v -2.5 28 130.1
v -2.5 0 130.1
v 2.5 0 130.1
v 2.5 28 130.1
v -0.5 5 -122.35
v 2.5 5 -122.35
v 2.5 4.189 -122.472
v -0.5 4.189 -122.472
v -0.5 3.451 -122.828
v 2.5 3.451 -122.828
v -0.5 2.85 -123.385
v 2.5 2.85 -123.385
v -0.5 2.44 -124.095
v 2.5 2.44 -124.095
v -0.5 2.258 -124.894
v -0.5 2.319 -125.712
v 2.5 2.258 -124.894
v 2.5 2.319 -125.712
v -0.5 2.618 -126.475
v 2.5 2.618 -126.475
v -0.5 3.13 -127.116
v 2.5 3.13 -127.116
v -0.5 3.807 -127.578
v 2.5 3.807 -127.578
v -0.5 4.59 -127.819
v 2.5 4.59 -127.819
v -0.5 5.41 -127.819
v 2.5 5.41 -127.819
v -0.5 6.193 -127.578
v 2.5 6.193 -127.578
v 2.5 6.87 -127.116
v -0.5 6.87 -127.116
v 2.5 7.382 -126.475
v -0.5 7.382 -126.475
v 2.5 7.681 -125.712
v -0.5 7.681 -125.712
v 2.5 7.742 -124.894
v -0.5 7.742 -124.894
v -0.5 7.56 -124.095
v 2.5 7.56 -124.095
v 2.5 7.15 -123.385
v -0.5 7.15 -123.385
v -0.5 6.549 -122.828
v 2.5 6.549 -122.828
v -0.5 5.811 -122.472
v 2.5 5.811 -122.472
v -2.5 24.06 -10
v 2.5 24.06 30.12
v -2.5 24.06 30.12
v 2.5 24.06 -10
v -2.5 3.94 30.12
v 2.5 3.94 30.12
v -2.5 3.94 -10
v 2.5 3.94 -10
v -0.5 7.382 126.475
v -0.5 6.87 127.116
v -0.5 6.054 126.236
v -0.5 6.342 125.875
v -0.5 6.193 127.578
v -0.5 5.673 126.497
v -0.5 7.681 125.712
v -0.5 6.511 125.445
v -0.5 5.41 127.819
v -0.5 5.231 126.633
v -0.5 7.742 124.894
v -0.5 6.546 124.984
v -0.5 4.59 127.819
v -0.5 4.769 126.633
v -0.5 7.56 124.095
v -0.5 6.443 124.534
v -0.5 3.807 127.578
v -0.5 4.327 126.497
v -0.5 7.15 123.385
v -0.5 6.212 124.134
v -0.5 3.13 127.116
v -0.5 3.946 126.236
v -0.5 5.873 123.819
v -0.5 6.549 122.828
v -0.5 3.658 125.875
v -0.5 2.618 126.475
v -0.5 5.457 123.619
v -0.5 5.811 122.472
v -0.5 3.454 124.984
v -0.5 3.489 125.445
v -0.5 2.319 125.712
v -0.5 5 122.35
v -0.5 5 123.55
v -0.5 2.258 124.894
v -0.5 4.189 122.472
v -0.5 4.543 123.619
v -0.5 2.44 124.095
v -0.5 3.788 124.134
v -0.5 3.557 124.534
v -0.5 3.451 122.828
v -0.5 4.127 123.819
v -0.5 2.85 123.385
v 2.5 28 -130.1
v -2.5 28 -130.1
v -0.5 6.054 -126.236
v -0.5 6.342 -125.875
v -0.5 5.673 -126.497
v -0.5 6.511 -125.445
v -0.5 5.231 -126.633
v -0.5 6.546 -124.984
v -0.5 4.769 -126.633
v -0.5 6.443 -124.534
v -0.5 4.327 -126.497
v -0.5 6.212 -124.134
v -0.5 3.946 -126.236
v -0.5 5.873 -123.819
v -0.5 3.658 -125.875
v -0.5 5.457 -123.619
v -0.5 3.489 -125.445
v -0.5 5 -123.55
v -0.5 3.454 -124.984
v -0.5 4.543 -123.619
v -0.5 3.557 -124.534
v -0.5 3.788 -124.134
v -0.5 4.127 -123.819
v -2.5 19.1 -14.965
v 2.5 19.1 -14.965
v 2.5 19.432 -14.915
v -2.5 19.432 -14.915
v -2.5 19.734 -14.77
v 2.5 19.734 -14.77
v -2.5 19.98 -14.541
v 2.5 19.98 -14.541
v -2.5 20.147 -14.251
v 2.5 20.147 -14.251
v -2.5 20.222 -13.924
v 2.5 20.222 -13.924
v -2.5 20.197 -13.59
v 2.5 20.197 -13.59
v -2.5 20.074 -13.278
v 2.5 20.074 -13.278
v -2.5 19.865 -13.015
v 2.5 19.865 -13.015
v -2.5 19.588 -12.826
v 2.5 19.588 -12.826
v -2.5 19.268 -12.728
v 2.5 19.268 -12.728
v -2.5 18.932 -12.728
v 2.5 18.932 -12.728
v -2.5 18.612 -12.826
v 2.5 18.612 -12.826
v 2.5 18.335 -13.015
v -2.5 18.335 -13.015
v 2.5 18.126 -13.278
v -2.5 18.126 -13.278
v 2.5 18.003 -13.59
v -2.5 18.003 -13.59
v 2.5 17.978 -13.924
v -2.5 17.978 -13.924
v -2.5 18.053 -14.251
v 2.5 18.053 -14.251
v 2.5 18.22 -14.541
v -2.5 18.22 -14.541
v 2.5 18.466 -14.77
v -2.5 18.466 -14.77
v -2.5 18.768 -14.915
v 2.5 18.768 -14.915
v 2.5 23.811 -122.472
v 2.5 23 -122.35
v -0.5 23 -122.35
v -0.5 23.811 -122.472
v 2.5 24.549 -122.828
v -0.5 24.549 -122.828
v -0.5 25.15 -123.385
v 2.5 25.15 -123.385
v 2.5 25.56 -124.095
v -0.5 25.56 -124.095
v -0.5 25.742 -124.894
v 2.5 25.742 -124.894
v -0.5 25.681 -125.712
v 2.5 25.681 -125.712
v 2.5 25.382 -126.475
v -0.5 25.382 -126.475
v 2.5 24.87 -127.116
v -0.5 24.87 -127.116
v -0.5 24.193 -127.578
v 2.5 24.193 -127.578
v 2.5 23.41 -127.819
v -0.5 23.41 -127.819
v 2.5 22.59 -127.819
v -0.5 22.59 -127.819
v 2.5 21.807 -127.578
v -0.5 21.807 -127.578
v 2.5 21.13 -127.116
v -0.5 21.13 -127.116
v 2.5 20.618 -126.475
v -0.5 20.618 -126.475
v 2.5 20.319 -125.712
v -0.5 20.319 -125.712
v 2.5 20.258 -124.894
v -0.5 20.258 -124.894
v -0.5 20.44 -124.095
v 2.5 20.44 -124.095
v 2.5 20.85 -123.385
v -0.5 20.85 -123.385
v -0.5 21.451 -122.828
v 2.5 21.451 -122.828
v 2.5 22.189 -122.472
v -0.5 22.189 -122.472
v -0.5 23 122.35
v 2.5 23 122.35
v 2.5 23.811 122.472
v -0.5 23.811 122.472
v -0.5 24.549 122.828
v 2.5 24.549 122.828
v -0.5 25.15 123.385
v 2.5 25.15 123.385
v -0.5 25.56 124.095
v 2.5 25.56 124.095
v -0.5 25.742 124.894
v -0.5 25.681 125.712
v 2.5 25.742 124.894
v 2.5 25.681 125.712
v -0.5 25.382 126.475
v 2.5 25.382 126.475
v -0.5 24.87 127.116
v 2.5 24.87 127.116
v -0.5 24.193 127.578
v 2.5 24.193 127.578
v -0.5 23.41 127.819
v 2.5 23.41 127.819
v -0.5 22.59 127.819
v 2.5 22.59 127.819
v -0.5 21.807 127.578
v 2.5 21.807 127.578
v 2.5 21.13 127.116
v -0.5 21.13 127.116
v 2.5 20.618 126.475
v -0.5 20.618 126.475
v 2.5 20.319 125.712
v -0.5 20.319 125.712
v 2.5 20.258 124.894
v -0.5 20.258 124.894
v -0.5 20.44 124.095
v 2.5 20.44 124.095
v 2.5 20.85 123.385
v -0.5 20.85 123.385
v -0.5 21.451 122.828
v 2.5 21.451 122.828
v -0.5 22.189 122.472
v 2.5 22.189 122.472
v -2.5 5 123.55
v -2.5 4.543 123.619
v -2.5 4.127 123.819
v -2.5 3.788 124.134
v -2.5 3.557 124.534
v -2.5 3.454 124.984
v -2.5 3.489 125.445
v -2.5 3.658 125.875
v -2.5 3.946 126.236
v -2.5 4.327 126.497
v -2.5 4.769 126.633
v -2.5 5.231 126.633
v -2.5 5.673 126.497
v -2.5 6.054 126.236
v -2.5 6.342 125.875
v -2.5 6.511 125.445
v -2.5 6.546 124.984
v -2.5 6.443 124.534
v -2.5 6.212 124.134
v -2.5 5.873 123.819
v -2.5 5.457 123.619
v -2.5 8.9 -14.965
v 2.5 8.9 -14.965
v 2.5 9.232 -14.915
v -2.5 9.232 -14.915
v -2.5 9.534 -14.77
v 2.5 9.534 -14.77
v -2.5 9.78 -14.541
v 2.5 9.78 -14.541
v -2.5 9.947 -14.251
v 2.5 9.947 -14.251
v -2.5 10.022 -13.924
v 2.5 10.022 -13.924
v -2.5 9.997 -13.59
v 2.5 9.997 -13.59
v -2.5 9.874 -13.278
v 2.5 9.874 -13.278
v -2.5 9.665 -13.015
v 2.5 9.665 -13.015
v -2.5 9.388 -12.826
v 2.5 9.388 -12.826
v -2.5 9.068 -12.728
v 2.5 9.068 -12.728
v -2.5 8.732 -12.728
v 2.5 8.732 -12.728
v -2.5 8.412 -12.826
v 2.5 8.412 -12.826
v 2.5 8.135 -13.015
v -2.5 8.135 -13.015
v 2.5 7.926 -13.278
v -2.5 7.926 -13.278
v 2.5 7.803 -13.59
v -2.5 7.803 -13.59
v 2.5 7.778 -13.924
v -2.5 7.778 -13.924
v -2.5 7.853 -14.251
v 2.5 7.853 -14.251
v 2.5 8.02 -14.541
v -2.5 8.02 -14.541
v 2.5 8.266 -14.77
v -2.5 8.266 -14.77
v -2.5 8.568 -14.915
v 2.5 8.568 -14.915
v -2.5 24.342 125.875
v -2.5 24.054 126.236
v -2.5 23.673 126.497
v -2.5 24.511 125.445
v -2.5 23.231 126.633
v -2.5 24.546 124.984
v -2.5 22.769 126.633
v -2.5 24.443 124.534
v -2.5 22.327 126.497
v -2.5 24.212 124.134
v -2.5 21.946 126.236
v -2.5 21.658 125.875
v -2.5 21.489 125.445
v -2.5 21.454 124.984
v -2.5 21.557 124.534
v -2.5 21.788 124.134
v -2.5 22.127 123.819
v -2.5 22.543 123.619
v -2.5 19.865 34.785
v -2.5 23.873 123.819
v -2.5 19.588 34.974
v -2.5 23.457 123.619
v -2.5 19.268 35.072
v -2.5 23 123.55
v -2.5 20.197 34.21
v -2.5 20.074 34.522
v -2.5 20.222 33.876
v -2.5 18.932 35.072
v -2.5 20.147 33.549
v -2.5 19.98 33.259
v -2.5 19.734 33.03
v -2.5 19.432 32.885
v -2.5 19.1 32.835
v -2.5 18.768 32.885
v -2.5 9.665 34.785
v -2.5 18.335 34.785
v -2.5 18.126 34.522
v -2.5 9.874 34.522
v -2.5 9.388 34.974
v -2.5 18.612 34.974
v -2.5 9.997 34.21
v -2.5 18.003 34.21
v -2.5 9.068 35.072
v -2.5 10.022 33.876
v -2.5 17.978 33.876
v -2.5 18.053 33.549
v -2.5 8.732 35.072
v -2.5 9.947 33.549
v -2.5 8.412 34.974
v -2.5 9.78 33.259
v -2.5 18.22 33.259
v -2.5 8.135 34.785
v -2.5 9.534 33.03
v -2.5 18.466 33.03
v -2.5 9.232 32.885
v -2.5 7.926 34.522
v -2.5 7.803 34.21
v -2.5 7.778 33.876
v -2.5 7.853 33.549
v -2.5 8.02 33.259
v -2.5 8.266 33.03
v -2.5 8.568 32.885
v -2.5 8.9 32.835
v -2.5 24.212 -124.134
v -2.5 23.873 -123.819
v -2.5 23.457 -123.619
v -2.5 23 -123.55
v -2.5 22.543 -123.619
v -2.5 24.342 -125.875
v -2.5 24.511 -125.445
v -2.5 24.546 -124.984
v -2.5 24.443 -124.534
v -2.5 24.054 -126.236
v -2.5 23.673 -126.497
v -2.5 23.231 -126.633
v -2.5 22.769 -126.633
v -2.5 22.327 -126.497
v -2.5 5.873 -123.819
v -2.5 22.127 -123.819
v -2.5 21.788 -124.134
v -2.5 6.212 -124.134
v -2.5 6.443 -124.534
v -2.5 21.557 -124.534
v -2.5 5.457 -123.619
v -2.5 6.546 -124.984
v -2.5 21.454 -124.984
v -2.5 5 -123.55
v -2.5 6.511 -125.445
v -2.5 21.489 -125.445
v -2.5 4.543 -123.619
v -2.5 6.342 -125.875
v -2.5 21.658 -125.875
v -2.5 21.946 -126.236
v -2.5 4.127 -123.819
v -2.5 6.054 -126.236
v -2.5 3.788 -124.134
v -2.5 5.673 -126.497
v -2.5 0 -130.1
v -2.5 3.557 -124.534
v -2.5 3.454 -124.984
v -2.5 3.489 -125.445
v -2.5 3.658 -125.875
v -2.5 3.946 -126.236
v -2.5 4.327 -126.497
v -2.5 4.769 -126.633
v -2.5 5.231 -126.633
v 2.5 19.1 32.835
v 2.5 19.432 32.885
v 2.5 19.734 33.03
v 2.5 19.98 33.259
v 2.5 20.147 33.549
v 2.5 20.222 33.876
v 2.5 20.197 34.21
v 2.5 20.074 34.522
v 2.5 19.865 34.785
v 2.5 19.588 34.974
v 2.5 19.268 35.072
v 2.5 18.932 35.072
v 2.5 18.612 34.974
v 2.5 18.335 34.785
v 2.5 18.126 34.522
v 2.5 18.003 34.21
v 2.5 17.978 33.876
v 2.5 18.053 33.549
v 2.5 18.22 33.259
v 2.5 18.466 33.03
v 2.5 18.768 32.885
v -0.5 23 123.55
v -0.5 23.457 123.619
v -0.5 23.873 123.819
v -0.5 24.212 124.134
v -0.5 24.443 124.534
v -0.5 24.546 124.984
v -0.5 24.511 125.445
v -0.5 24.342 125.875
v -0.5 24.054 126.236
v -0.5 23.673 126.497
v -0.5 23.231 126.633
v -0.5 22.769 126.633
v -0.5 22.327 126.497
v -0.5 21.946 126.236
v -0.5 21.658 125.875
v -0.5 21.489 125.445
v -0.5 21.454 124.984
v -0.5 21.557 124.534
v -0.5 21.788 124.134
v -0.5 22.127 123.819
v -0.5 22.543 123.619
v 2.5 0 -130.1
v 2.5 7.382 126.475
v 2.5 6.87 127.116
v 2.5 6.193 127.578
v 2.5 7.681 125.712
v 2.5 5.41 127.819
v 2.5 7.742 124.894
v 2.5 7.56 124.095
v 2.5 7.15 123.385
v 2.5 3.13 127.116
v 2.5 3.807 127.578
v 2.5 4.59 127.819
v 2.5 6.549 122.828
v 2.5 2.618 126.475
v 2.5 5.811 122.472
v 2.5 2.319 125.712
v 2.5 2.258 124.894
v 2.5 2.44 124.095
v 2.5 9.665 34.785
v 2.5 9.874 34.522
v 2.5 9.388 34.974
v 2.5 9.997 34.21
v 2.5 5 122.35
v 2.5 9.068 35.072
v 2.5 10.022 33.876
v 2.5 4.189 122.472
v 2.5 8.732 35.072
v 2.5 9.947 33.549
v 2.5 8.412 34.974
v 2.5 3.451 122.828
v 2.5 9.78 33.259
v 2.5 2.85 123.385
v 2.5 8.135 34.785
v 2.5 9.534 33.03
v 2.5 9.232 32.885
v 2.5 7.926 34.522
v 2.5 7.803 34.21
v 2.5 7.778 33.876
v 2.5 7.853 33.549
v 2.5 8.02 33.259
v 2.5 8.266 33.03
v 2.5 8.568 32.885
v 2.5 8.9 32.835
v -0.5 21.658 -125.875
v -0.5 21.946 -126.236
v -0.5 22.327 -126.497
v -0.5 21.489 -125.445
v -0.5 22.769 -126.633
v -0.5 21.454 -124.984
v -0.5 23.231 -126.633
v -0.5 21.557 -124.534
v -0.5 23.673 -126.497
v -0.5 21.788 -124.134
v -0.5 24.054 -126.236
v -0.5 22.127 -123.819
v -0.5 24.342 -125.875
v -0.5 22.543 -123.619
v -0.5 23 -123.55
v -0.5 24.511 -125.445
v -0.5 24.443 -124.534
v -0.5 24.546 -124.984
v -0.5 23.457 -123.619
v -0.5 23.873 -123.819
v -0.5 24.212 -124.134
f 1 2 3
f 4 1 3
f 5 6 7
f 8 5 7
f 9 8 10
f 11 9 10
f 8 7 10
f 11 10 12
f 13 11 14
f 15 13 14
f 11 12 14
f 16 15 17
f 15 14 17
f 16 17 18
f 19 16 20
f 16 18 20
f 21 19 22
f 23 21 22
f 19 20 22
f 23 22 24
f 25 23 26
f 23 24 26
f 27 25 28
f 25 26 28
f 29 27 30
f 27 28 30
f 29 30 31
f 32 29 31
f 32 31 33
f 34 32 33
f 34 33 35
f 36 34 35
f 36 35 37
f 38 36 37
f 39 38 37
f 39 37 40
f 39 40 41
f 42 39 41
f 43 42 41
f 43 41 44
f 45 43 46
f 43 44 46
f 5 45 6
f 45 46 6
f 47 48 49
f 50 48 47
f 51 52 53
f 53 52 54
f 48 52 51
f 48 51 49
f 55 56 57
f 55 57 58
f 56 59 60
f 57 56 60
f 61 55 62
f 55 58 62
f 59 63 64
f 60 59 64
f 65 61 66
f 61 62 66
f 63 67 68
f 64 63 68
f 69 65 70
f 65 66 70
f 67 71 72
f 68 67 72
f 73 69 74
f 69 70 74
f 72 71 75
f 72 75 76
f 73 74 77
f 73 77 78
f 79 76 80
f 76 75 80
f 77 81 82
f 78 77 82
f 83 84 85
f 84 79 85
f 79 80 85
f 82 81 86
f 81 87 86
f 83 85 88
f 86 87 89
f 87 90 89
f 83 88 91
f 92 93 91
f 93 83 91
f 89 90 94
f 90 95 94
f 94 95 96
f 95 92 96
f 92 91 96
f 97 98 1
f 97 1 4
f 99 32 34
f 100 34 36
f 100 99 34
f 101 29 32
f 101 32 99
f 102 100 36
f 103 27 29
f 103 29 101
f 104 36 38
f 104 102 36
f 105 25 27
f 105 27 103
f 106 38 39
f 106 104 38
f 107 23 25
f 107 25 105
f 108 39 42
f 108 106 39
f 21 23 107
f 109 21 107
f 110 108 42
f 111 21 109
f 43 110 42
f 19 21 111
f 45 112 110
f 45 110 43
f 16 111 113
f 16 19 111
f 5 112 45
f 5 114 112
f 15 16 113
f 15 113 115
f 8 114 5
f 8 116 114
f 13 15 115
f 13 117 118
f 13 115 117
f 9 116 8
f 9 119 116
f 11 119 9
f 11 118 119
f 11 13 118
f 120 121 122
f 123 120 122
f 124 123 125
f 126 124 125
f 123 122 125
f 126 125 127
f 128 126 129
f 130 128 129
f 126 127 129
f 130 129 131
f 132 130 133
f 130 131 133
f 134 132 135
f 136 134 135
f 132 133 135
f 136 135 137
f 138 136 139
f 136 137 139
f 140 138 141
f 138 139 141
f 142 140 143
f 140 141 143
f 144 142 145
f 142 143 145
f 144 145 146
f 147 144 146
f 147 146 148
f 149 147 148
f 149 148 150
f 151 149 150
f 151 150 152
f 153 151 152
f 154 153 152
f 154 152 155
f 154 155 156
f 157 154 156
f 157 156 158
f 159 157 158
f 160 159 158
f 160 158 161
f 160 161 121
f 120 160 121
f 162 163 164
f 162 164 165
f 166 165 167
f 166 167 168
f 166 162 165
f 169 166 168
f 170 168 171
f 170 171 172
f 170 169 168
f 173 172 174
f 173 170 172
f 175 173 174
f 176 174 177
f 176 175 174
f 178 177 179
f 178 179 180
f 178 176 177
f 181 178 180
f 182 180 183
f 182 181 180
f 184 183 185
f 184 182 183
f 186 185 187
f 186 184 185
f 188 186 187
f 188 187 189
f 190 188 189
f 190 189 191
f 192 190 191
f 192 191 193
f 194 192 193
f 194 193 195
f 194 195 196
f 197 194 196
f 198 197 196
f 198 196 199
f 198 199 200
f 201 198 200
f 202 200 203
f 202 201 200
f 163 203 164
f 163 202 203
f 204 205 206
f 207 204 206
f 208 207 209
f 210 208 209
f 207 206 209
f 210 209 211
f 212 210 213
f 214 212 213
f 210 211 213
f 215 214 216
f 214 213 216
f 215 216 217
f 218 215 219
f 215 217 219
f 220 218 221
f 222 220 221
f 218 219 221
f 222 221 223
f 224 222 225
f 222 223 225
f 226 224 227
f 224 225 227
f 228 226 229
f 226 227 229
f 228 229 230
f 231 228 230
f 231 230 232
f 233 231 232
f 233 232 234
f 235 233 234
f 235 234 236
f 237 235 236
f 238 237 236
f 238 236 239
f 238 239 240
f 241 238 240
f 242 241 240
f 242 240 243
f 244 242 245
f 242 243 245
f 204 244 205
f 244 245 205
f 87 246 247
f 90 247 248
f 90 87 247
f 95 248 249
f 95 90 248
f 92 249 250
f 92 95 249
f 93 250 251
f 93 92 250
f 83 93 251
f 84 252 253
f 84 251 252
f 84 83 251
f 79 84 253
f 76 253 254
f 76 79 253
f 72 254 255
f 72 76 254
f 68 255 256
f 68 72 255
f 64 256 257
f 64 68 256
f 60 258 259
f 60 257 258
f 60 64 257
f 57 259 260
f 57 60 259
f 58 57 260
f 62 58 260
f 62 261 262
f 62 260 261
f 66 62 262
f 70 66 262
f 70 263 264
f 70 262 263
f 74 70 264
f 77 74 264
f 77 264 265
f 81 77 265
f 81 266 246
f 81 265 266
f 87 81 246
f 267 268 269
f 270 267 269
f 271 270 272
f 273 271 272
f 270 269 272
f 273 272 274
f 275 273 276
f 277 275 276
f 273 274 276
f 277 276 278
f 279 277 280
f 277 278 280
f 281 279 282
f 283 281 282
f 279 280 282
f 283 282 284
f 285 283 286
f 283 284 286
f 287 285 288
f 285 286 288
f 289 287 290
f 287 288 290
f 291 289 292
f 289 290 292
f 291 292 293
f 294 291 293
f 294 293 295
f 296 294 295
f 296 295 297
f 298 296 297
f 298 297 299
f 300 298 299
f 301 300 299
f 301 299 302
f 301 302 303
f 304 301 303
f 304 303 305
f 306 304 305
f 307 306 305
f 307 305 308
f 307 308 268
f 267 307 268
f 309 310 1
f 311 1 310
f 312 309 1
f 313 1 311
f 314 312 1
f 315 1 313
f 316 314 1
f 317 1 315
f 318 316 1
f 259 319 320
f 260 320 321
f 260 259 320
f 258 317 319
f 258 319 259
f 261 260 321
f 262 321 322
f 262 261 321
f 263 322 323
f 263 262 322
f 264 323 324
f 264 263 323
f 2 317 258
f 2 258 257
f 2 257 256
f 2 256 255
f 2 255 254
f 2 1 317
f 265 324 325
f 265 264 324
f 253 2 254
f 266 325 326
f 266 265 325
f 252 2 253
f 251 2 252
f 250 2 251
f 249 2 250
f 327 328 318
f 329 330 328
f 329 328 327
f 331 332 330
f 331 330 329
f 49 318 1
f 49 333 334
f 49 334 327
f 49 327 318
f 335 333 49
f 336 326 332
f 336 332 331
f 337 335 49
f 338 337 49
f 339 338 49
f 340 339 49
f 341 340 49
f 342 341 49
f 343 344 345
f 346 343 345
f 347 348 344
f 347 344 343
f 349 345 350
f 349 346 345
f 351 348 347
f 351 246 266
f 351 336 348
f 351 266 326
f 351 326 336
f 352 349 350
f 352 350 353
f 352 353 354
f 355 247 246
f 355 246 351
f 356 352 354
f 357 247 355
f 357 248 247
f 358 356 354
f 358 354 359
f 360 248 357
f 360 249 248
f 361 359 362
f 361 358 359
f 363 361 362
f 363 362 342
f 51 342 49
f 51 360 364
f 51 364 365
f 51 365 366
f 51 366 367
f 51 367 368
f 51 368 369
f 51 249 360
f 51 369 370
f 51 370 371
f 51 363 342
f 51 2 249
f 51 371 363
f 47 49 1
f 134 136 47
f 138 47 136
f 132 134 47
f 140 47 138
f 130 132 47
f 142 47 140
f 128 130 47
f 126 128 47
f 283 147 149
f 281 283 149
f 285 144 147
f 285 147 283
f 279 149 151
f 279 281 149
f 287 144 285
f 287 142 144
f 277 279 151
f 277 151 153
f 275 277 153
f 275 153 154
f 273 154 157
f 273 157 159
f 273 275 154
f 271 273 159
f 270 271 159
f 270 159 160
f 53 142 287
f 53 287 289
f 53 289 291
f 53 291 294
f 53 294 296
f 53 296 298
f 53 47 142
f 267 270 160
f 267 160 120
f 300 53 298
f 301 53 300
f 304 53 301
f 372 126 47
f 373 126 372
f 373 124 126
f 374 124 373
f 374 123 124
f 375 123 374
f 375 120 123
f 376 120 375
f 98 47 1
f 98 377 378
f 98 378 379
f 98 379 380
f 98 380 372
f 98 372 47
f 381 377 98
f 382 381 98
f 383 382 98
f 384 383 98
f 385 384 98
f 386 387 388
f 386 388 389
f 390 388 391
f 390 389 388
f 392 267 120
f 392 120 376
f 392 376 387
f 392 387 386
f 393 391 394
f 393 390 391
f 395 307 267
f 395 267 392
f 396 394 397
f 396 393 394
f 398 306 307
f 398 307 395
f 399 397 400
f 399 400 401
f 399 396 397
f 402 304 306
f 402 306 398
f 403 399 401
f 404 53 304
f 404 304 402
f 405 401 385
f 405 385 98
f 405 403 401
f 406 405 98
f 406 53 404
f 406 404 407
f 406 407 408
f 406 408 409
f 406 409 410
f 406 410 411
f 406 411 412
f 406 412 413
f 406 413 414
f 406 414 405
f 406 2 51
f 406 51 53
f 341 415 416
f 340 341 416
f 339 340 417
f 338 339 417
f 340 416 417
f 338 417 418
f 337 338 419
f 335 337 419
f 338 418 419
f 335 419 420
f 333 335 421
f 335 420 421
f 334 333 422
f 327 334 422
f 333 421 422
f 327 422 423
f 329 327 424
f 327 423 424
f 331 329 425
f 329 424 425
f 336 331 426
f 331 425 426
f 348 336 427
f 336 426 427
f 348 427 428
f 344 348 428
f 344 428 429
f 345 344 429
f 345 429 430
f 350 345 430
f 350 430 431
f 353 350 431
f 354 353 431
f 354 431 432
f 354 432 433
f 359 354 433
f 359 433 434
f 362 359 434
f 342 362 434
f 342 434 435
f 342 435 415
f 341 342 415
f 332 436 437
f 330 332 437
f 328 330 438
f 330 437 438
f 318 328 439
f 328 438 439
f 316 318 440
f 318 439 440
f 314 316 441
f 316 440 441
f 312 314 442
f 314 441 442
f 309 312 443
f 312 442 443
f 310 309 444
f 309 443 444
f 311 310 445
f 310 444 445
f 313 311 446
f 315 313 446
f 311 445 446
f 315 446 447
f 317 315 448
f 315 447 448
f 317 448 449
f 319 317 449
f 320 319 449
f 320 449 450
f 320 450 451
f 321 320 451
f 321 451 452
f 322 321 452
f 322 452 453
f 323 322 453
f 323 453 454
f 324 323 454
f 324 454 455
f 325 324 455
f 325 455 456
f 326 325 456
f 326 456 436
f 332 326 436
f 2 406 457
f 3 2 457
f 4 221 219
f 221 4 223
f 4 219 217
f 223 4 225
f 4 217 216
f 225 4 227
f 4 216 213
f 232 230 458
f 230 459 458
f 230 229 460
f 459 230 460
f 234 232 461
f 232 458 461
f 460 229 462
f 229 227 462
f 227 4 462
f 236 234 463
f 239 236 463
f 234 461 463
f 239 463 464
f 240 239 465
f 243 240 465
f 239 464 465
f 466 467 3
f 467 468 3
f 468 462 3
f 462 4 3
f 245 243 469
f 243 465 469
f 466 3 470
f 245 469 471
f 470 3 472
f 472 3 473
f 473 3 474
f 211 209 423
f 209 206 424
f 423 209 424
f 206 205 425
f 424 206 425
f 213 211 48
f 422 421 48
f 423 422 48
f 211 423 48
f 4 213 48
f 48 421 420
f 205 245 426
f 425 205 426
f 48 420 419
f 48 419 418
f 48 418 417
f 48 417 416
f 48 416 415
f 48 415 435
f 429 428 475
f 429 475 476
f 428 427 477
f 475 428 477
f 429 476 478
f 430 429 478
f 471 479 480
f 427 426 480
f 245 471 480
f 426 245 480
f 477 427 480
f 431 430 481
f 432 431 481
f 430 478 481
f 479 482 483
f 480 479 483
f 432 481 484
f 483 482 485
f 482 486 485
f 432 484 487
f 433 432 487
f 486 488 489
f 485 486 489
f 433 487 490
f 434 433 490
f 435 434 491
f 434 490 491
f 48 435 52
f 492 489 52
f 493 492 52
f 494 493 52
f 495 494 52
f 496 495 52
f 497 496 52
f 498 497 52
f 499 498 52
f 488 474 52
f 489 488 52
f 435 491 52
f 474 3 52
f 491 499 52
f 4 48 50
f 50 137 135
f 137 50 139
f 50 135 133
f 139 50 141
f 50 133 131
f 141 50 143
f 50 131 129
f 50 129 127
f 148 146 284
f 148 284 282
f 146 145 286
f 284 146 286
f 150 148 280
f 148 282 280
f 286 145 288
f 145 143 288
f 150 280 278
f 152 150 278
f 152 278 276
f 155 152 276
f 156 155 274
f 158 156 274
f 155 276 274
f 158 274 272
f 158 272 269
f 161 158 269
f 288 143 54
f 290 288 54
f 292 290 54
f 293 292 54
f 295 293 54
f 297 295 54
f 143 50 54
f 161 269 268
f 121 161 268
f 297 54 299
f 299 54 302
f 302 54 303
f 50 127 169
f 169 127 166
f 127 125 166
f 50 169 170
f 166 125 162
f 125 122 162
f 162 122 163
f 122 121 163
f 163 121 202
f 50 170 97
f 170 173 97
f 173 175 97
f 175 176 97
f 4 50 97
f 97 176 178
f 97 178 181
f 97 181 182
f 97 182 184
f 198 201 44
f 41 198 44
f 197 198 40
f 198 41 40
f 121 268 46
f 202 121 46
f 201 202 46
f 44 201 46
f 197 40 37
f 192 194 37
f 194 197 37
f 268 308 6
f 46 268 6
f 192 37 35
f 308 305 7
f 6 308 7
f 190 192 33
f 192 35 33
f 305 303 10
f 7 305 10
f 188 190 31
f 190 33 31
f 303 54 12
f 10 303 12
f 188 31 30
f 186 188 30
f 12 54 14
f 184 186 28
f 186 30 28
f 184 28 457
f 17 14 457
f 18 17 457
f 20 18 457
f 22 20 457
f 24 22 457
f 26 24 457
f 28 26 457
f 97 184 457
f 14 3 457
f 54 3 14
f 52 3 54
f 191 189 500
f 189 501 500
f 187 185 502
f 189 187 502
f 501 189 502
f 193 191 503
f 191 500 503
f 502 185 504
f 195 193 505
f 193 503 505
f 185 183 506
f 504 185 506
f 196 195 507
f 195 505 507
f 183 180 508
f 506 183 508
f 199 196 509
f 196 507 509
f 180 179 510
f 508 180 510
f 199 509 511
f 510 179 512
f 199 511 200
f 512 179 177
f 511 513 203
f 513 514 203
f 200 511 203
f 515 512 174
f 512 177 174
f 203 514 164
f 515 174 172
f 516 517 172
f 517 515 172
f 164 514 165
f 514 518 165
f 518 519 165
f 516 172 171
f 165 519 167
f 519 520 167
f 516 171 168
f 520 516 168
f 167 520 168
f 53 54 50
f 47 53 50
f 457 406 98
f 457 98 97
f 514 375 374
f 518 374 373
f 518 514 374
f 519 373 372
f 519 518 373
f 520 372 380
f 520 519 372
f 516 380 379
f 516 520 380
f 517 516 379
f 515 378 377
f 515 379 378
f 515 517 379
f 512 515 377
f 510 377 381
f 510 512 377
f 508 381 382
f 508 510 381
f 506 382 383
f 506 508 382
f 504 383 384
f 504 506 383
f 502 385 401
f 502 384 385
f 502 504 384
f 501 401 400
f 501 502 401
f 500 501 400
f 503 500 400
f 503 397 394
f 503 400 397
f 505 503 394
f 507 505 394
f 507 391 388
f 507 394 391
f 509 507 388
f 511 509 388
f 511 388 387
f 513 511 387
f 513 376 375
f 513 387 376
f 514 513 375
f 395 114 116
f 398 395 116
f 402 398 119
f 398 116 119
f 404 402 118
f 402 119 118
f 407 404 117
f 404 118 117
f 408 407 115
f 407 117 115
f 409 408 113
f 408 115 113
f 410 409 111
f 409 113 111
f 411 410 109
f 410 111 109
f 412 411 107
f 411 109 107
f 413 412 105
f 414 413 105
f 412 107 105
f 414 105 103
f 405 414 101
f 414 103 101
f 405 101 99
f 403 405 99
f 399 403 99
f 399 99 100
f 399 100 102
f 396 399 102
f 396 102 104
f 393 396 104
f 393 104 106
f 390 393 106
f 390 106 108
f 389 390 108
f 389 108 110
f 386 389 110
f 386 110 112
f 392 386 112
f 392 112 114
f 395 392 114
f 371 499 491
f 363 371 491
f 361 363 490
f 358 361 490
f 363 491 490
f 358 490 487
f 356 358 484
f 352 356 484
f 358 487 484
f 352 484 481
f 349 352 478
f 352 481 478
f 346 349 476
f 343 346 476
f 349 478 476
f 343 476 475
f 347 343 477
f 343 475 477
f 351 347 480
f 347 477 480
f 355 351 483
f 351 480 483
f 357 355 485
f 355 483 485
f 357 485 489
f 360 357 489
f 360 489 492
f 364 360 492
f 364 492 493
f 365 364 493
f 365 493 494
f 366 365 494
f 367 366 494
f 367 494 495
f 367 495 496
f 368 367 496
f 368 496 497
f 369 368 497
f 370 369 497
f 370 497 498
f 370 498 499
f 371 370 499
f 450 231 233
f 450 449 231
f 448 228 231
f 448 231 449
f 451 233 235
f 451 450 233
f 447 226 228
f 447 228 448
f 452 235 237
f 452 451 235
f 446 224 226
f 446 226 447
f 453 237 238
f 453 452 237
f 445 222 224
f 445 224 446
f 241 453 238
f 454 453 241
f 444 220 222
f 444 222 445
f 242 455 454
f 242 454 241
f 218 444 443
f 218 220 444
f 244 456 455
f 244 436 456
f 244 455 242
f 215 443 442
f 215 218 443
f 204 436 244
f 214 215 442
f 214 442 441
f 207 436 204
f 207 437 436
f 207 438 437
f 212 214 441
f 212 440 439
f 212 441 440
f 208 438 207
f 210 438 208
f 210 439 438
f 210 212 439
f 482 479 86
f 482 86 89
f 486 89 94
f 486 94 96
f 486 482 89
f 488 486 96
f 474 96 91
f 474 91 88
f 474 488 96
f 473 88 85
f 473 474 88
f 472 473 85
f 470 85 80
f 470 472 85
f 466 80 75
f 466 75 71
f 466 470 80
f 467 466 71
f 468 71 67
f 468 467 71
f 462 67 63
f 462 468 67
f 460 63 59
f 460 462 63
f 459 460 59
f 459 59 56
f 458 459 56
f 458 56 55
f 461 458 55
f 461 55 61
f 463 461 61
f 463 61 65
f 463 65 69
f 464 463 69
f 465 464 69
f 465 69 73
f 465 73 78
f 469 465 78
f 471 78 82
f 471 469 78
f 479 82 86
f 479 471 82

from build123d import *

# Parameters (mm, degrees)
SKETCH1_W                                  = 5
SKETCH1_H                                  = 260.2
BOSS_EXTRUDE1_DEPTH                        = 28
SKETCH2_W                                  = 40.12
SKETCH2_H                                  = 20.12
CUT_EXTRUDE1_DEPTH                         = 134.172857595
SKETCH3_R                                  = 1.125
CUT_EXTRUDE2_DEPTH                         = 134.172857595
SKETCH4_R                                  = 2.75
CUT_EXTRUDE3_DEPTH                         = 3
SKETCH5_R                                  = 1.55
CUT_EXTRUDE4_DEPTH                         = 134.112771739
MIRROR2_AT_THE_SECOND_PLANE_COPY_1_SKETC_R = 2.75
MIRROR2_AT_THE_SECOND_PLANE_COPY_1_DEPTH   = 3
MIRROR2_AT_THE_SECOND_PLANE_COPY_2_SKETC_R = 1.55
MIRROR2_AT_THE_SECOND_PLANE_COPY_2_DEPTH   = 134.112771739


with BuildPart() as part:
    # Sketch1 → Boss-Extrude1 (new body)
    with BuildSketch(Plane(origin=(0, 0, 0), x_dir=(1, 0, 0), z_dir=(0, 1, 0))):
        Rectangle(SKETCH1_W, SKETCH1_H)
    extrude(amount=BOSS_EXTRUDE1_DEPTH)

    # Sketch2 → Cut-Extrude1 (cut, through all)
    with BuildSketch(Plane(origin=(2.5, 0, 0), x_dir=(0, 0, -1), z_dir=(1, 0, 0))):
        with Locations((-10.06, 14)):
            Rectangle(SKETCH2_W, SKETCH2_H)
    extrude(amount=-CUT_EXTRUDE1_DEPTH, mode=Mode.SUBTRACT)

    # Sketch3 → Cut-Extrude2 (cut, through all)
    with BuildSketch(Plane(origin=(2.5, 0, 0), x_dir=(0, 0, -1), z_dir=(1, 0, 0))):
        with Locations((-33.96, 19.1)):
            Circle(SKETCH3_R)
        with Locations((-33.96, 8.9)):
            Circle(SKETCH3_R)
        with Locations((13.84, 19.1)):
            Circle(SKETCH3_R)
        with Locations((13.84, 8.9)):
            Circle(SKETCH3_R)
    extrude(amount=-CUT_EXTRUDE2_DEPTH, mode=Mode.SUBTRACT)

    # Sketch4 → Cut-Extrude3 (cut)
    with BuildSketch(Plane(origin=(2.5, 0, 0), x_dir=(0, 0, -1), z_dir=(1, 0, 0))):
        with Locations((-125.1, 23)):
            Circle(SKETCH4_R)
    cut_extrude3 = extrude(amount=-CUT_EXTRUDE3_DEPTH, mode=Mode.SUBTRACT)

    # Sketch5 → Cut-Extrude4 (cut, through all)
    with BuildSketch(Plane(origin=(-0.5, 0, 0), x_dir=(0, 0, -1), z_dir=(1, 0, 0))):
        with Locations((-125.1, 23)):
            Circle(SKETCH5_R)
    cut_extrude4 = extrude(amount=-CUT_EXTRUDE4_DEPTH, mode=Mode.SUBTRACT)

    # Mirror2: Cut-Extrude3, Cut-Extrude4 across plane
    add(cut_extrude3.mirror(Plane.XY), mode=Mode.SUBTRACT)
    add(cut_extrude4.mirror(Plane.XY), mode=Mode.SUBTRACT)

    # Mirror2 at the second plane: Cut-Extrude3, Cut-Extrude4 across plane
    add(cut_extrude3.mirror(Plane.ZX.offset(14)), mode=Mode.SUBTRACT)
    add(cut_extrude4.mirror(Plane.ZX.offset(14)), mode=Mode.SUBTRACT)

    # Mirror2 at the second plane copy 1 sketc → Mirror2 at the second plane copy 1 (cut)
    with BuildSketch(Plane(origin=(2.5, 28, 0), x_dir=(0, 0, 1), z_dir=(1, 0, 0))):
        with Locations((-125.1, 23)):
            Circle(MIRROR2_AT_THE_SECOND_PLANE_COPY_1_SKETC_R)
    extrude(amount=-MIRROR2_AT_THE_SECOND_PLANE_COPY_1_DEPTH, mode=Mode.SUBTRACT)

    # Mirror2 at the second plane copy 2 sketc → Mirror2 at the second plane copy 2 (cut, through all)
    with BuildSketch(Plane(origin=(-0.5, 28, 0), x_dir=(0, 0, 1), z_dir=(1, 0, 0))):
        with Locations((-125.1, 23)):
            Circle(MIRROR2_AT_THE_SECOND_PLANE_COPY_2_SKETC_R)
    extrude(amount=-MIRROR2_AT_THE_SECOND_PLANE_COPY_2_DEPTH, mode=Mode.SUBTRACT)


solid = part.part
